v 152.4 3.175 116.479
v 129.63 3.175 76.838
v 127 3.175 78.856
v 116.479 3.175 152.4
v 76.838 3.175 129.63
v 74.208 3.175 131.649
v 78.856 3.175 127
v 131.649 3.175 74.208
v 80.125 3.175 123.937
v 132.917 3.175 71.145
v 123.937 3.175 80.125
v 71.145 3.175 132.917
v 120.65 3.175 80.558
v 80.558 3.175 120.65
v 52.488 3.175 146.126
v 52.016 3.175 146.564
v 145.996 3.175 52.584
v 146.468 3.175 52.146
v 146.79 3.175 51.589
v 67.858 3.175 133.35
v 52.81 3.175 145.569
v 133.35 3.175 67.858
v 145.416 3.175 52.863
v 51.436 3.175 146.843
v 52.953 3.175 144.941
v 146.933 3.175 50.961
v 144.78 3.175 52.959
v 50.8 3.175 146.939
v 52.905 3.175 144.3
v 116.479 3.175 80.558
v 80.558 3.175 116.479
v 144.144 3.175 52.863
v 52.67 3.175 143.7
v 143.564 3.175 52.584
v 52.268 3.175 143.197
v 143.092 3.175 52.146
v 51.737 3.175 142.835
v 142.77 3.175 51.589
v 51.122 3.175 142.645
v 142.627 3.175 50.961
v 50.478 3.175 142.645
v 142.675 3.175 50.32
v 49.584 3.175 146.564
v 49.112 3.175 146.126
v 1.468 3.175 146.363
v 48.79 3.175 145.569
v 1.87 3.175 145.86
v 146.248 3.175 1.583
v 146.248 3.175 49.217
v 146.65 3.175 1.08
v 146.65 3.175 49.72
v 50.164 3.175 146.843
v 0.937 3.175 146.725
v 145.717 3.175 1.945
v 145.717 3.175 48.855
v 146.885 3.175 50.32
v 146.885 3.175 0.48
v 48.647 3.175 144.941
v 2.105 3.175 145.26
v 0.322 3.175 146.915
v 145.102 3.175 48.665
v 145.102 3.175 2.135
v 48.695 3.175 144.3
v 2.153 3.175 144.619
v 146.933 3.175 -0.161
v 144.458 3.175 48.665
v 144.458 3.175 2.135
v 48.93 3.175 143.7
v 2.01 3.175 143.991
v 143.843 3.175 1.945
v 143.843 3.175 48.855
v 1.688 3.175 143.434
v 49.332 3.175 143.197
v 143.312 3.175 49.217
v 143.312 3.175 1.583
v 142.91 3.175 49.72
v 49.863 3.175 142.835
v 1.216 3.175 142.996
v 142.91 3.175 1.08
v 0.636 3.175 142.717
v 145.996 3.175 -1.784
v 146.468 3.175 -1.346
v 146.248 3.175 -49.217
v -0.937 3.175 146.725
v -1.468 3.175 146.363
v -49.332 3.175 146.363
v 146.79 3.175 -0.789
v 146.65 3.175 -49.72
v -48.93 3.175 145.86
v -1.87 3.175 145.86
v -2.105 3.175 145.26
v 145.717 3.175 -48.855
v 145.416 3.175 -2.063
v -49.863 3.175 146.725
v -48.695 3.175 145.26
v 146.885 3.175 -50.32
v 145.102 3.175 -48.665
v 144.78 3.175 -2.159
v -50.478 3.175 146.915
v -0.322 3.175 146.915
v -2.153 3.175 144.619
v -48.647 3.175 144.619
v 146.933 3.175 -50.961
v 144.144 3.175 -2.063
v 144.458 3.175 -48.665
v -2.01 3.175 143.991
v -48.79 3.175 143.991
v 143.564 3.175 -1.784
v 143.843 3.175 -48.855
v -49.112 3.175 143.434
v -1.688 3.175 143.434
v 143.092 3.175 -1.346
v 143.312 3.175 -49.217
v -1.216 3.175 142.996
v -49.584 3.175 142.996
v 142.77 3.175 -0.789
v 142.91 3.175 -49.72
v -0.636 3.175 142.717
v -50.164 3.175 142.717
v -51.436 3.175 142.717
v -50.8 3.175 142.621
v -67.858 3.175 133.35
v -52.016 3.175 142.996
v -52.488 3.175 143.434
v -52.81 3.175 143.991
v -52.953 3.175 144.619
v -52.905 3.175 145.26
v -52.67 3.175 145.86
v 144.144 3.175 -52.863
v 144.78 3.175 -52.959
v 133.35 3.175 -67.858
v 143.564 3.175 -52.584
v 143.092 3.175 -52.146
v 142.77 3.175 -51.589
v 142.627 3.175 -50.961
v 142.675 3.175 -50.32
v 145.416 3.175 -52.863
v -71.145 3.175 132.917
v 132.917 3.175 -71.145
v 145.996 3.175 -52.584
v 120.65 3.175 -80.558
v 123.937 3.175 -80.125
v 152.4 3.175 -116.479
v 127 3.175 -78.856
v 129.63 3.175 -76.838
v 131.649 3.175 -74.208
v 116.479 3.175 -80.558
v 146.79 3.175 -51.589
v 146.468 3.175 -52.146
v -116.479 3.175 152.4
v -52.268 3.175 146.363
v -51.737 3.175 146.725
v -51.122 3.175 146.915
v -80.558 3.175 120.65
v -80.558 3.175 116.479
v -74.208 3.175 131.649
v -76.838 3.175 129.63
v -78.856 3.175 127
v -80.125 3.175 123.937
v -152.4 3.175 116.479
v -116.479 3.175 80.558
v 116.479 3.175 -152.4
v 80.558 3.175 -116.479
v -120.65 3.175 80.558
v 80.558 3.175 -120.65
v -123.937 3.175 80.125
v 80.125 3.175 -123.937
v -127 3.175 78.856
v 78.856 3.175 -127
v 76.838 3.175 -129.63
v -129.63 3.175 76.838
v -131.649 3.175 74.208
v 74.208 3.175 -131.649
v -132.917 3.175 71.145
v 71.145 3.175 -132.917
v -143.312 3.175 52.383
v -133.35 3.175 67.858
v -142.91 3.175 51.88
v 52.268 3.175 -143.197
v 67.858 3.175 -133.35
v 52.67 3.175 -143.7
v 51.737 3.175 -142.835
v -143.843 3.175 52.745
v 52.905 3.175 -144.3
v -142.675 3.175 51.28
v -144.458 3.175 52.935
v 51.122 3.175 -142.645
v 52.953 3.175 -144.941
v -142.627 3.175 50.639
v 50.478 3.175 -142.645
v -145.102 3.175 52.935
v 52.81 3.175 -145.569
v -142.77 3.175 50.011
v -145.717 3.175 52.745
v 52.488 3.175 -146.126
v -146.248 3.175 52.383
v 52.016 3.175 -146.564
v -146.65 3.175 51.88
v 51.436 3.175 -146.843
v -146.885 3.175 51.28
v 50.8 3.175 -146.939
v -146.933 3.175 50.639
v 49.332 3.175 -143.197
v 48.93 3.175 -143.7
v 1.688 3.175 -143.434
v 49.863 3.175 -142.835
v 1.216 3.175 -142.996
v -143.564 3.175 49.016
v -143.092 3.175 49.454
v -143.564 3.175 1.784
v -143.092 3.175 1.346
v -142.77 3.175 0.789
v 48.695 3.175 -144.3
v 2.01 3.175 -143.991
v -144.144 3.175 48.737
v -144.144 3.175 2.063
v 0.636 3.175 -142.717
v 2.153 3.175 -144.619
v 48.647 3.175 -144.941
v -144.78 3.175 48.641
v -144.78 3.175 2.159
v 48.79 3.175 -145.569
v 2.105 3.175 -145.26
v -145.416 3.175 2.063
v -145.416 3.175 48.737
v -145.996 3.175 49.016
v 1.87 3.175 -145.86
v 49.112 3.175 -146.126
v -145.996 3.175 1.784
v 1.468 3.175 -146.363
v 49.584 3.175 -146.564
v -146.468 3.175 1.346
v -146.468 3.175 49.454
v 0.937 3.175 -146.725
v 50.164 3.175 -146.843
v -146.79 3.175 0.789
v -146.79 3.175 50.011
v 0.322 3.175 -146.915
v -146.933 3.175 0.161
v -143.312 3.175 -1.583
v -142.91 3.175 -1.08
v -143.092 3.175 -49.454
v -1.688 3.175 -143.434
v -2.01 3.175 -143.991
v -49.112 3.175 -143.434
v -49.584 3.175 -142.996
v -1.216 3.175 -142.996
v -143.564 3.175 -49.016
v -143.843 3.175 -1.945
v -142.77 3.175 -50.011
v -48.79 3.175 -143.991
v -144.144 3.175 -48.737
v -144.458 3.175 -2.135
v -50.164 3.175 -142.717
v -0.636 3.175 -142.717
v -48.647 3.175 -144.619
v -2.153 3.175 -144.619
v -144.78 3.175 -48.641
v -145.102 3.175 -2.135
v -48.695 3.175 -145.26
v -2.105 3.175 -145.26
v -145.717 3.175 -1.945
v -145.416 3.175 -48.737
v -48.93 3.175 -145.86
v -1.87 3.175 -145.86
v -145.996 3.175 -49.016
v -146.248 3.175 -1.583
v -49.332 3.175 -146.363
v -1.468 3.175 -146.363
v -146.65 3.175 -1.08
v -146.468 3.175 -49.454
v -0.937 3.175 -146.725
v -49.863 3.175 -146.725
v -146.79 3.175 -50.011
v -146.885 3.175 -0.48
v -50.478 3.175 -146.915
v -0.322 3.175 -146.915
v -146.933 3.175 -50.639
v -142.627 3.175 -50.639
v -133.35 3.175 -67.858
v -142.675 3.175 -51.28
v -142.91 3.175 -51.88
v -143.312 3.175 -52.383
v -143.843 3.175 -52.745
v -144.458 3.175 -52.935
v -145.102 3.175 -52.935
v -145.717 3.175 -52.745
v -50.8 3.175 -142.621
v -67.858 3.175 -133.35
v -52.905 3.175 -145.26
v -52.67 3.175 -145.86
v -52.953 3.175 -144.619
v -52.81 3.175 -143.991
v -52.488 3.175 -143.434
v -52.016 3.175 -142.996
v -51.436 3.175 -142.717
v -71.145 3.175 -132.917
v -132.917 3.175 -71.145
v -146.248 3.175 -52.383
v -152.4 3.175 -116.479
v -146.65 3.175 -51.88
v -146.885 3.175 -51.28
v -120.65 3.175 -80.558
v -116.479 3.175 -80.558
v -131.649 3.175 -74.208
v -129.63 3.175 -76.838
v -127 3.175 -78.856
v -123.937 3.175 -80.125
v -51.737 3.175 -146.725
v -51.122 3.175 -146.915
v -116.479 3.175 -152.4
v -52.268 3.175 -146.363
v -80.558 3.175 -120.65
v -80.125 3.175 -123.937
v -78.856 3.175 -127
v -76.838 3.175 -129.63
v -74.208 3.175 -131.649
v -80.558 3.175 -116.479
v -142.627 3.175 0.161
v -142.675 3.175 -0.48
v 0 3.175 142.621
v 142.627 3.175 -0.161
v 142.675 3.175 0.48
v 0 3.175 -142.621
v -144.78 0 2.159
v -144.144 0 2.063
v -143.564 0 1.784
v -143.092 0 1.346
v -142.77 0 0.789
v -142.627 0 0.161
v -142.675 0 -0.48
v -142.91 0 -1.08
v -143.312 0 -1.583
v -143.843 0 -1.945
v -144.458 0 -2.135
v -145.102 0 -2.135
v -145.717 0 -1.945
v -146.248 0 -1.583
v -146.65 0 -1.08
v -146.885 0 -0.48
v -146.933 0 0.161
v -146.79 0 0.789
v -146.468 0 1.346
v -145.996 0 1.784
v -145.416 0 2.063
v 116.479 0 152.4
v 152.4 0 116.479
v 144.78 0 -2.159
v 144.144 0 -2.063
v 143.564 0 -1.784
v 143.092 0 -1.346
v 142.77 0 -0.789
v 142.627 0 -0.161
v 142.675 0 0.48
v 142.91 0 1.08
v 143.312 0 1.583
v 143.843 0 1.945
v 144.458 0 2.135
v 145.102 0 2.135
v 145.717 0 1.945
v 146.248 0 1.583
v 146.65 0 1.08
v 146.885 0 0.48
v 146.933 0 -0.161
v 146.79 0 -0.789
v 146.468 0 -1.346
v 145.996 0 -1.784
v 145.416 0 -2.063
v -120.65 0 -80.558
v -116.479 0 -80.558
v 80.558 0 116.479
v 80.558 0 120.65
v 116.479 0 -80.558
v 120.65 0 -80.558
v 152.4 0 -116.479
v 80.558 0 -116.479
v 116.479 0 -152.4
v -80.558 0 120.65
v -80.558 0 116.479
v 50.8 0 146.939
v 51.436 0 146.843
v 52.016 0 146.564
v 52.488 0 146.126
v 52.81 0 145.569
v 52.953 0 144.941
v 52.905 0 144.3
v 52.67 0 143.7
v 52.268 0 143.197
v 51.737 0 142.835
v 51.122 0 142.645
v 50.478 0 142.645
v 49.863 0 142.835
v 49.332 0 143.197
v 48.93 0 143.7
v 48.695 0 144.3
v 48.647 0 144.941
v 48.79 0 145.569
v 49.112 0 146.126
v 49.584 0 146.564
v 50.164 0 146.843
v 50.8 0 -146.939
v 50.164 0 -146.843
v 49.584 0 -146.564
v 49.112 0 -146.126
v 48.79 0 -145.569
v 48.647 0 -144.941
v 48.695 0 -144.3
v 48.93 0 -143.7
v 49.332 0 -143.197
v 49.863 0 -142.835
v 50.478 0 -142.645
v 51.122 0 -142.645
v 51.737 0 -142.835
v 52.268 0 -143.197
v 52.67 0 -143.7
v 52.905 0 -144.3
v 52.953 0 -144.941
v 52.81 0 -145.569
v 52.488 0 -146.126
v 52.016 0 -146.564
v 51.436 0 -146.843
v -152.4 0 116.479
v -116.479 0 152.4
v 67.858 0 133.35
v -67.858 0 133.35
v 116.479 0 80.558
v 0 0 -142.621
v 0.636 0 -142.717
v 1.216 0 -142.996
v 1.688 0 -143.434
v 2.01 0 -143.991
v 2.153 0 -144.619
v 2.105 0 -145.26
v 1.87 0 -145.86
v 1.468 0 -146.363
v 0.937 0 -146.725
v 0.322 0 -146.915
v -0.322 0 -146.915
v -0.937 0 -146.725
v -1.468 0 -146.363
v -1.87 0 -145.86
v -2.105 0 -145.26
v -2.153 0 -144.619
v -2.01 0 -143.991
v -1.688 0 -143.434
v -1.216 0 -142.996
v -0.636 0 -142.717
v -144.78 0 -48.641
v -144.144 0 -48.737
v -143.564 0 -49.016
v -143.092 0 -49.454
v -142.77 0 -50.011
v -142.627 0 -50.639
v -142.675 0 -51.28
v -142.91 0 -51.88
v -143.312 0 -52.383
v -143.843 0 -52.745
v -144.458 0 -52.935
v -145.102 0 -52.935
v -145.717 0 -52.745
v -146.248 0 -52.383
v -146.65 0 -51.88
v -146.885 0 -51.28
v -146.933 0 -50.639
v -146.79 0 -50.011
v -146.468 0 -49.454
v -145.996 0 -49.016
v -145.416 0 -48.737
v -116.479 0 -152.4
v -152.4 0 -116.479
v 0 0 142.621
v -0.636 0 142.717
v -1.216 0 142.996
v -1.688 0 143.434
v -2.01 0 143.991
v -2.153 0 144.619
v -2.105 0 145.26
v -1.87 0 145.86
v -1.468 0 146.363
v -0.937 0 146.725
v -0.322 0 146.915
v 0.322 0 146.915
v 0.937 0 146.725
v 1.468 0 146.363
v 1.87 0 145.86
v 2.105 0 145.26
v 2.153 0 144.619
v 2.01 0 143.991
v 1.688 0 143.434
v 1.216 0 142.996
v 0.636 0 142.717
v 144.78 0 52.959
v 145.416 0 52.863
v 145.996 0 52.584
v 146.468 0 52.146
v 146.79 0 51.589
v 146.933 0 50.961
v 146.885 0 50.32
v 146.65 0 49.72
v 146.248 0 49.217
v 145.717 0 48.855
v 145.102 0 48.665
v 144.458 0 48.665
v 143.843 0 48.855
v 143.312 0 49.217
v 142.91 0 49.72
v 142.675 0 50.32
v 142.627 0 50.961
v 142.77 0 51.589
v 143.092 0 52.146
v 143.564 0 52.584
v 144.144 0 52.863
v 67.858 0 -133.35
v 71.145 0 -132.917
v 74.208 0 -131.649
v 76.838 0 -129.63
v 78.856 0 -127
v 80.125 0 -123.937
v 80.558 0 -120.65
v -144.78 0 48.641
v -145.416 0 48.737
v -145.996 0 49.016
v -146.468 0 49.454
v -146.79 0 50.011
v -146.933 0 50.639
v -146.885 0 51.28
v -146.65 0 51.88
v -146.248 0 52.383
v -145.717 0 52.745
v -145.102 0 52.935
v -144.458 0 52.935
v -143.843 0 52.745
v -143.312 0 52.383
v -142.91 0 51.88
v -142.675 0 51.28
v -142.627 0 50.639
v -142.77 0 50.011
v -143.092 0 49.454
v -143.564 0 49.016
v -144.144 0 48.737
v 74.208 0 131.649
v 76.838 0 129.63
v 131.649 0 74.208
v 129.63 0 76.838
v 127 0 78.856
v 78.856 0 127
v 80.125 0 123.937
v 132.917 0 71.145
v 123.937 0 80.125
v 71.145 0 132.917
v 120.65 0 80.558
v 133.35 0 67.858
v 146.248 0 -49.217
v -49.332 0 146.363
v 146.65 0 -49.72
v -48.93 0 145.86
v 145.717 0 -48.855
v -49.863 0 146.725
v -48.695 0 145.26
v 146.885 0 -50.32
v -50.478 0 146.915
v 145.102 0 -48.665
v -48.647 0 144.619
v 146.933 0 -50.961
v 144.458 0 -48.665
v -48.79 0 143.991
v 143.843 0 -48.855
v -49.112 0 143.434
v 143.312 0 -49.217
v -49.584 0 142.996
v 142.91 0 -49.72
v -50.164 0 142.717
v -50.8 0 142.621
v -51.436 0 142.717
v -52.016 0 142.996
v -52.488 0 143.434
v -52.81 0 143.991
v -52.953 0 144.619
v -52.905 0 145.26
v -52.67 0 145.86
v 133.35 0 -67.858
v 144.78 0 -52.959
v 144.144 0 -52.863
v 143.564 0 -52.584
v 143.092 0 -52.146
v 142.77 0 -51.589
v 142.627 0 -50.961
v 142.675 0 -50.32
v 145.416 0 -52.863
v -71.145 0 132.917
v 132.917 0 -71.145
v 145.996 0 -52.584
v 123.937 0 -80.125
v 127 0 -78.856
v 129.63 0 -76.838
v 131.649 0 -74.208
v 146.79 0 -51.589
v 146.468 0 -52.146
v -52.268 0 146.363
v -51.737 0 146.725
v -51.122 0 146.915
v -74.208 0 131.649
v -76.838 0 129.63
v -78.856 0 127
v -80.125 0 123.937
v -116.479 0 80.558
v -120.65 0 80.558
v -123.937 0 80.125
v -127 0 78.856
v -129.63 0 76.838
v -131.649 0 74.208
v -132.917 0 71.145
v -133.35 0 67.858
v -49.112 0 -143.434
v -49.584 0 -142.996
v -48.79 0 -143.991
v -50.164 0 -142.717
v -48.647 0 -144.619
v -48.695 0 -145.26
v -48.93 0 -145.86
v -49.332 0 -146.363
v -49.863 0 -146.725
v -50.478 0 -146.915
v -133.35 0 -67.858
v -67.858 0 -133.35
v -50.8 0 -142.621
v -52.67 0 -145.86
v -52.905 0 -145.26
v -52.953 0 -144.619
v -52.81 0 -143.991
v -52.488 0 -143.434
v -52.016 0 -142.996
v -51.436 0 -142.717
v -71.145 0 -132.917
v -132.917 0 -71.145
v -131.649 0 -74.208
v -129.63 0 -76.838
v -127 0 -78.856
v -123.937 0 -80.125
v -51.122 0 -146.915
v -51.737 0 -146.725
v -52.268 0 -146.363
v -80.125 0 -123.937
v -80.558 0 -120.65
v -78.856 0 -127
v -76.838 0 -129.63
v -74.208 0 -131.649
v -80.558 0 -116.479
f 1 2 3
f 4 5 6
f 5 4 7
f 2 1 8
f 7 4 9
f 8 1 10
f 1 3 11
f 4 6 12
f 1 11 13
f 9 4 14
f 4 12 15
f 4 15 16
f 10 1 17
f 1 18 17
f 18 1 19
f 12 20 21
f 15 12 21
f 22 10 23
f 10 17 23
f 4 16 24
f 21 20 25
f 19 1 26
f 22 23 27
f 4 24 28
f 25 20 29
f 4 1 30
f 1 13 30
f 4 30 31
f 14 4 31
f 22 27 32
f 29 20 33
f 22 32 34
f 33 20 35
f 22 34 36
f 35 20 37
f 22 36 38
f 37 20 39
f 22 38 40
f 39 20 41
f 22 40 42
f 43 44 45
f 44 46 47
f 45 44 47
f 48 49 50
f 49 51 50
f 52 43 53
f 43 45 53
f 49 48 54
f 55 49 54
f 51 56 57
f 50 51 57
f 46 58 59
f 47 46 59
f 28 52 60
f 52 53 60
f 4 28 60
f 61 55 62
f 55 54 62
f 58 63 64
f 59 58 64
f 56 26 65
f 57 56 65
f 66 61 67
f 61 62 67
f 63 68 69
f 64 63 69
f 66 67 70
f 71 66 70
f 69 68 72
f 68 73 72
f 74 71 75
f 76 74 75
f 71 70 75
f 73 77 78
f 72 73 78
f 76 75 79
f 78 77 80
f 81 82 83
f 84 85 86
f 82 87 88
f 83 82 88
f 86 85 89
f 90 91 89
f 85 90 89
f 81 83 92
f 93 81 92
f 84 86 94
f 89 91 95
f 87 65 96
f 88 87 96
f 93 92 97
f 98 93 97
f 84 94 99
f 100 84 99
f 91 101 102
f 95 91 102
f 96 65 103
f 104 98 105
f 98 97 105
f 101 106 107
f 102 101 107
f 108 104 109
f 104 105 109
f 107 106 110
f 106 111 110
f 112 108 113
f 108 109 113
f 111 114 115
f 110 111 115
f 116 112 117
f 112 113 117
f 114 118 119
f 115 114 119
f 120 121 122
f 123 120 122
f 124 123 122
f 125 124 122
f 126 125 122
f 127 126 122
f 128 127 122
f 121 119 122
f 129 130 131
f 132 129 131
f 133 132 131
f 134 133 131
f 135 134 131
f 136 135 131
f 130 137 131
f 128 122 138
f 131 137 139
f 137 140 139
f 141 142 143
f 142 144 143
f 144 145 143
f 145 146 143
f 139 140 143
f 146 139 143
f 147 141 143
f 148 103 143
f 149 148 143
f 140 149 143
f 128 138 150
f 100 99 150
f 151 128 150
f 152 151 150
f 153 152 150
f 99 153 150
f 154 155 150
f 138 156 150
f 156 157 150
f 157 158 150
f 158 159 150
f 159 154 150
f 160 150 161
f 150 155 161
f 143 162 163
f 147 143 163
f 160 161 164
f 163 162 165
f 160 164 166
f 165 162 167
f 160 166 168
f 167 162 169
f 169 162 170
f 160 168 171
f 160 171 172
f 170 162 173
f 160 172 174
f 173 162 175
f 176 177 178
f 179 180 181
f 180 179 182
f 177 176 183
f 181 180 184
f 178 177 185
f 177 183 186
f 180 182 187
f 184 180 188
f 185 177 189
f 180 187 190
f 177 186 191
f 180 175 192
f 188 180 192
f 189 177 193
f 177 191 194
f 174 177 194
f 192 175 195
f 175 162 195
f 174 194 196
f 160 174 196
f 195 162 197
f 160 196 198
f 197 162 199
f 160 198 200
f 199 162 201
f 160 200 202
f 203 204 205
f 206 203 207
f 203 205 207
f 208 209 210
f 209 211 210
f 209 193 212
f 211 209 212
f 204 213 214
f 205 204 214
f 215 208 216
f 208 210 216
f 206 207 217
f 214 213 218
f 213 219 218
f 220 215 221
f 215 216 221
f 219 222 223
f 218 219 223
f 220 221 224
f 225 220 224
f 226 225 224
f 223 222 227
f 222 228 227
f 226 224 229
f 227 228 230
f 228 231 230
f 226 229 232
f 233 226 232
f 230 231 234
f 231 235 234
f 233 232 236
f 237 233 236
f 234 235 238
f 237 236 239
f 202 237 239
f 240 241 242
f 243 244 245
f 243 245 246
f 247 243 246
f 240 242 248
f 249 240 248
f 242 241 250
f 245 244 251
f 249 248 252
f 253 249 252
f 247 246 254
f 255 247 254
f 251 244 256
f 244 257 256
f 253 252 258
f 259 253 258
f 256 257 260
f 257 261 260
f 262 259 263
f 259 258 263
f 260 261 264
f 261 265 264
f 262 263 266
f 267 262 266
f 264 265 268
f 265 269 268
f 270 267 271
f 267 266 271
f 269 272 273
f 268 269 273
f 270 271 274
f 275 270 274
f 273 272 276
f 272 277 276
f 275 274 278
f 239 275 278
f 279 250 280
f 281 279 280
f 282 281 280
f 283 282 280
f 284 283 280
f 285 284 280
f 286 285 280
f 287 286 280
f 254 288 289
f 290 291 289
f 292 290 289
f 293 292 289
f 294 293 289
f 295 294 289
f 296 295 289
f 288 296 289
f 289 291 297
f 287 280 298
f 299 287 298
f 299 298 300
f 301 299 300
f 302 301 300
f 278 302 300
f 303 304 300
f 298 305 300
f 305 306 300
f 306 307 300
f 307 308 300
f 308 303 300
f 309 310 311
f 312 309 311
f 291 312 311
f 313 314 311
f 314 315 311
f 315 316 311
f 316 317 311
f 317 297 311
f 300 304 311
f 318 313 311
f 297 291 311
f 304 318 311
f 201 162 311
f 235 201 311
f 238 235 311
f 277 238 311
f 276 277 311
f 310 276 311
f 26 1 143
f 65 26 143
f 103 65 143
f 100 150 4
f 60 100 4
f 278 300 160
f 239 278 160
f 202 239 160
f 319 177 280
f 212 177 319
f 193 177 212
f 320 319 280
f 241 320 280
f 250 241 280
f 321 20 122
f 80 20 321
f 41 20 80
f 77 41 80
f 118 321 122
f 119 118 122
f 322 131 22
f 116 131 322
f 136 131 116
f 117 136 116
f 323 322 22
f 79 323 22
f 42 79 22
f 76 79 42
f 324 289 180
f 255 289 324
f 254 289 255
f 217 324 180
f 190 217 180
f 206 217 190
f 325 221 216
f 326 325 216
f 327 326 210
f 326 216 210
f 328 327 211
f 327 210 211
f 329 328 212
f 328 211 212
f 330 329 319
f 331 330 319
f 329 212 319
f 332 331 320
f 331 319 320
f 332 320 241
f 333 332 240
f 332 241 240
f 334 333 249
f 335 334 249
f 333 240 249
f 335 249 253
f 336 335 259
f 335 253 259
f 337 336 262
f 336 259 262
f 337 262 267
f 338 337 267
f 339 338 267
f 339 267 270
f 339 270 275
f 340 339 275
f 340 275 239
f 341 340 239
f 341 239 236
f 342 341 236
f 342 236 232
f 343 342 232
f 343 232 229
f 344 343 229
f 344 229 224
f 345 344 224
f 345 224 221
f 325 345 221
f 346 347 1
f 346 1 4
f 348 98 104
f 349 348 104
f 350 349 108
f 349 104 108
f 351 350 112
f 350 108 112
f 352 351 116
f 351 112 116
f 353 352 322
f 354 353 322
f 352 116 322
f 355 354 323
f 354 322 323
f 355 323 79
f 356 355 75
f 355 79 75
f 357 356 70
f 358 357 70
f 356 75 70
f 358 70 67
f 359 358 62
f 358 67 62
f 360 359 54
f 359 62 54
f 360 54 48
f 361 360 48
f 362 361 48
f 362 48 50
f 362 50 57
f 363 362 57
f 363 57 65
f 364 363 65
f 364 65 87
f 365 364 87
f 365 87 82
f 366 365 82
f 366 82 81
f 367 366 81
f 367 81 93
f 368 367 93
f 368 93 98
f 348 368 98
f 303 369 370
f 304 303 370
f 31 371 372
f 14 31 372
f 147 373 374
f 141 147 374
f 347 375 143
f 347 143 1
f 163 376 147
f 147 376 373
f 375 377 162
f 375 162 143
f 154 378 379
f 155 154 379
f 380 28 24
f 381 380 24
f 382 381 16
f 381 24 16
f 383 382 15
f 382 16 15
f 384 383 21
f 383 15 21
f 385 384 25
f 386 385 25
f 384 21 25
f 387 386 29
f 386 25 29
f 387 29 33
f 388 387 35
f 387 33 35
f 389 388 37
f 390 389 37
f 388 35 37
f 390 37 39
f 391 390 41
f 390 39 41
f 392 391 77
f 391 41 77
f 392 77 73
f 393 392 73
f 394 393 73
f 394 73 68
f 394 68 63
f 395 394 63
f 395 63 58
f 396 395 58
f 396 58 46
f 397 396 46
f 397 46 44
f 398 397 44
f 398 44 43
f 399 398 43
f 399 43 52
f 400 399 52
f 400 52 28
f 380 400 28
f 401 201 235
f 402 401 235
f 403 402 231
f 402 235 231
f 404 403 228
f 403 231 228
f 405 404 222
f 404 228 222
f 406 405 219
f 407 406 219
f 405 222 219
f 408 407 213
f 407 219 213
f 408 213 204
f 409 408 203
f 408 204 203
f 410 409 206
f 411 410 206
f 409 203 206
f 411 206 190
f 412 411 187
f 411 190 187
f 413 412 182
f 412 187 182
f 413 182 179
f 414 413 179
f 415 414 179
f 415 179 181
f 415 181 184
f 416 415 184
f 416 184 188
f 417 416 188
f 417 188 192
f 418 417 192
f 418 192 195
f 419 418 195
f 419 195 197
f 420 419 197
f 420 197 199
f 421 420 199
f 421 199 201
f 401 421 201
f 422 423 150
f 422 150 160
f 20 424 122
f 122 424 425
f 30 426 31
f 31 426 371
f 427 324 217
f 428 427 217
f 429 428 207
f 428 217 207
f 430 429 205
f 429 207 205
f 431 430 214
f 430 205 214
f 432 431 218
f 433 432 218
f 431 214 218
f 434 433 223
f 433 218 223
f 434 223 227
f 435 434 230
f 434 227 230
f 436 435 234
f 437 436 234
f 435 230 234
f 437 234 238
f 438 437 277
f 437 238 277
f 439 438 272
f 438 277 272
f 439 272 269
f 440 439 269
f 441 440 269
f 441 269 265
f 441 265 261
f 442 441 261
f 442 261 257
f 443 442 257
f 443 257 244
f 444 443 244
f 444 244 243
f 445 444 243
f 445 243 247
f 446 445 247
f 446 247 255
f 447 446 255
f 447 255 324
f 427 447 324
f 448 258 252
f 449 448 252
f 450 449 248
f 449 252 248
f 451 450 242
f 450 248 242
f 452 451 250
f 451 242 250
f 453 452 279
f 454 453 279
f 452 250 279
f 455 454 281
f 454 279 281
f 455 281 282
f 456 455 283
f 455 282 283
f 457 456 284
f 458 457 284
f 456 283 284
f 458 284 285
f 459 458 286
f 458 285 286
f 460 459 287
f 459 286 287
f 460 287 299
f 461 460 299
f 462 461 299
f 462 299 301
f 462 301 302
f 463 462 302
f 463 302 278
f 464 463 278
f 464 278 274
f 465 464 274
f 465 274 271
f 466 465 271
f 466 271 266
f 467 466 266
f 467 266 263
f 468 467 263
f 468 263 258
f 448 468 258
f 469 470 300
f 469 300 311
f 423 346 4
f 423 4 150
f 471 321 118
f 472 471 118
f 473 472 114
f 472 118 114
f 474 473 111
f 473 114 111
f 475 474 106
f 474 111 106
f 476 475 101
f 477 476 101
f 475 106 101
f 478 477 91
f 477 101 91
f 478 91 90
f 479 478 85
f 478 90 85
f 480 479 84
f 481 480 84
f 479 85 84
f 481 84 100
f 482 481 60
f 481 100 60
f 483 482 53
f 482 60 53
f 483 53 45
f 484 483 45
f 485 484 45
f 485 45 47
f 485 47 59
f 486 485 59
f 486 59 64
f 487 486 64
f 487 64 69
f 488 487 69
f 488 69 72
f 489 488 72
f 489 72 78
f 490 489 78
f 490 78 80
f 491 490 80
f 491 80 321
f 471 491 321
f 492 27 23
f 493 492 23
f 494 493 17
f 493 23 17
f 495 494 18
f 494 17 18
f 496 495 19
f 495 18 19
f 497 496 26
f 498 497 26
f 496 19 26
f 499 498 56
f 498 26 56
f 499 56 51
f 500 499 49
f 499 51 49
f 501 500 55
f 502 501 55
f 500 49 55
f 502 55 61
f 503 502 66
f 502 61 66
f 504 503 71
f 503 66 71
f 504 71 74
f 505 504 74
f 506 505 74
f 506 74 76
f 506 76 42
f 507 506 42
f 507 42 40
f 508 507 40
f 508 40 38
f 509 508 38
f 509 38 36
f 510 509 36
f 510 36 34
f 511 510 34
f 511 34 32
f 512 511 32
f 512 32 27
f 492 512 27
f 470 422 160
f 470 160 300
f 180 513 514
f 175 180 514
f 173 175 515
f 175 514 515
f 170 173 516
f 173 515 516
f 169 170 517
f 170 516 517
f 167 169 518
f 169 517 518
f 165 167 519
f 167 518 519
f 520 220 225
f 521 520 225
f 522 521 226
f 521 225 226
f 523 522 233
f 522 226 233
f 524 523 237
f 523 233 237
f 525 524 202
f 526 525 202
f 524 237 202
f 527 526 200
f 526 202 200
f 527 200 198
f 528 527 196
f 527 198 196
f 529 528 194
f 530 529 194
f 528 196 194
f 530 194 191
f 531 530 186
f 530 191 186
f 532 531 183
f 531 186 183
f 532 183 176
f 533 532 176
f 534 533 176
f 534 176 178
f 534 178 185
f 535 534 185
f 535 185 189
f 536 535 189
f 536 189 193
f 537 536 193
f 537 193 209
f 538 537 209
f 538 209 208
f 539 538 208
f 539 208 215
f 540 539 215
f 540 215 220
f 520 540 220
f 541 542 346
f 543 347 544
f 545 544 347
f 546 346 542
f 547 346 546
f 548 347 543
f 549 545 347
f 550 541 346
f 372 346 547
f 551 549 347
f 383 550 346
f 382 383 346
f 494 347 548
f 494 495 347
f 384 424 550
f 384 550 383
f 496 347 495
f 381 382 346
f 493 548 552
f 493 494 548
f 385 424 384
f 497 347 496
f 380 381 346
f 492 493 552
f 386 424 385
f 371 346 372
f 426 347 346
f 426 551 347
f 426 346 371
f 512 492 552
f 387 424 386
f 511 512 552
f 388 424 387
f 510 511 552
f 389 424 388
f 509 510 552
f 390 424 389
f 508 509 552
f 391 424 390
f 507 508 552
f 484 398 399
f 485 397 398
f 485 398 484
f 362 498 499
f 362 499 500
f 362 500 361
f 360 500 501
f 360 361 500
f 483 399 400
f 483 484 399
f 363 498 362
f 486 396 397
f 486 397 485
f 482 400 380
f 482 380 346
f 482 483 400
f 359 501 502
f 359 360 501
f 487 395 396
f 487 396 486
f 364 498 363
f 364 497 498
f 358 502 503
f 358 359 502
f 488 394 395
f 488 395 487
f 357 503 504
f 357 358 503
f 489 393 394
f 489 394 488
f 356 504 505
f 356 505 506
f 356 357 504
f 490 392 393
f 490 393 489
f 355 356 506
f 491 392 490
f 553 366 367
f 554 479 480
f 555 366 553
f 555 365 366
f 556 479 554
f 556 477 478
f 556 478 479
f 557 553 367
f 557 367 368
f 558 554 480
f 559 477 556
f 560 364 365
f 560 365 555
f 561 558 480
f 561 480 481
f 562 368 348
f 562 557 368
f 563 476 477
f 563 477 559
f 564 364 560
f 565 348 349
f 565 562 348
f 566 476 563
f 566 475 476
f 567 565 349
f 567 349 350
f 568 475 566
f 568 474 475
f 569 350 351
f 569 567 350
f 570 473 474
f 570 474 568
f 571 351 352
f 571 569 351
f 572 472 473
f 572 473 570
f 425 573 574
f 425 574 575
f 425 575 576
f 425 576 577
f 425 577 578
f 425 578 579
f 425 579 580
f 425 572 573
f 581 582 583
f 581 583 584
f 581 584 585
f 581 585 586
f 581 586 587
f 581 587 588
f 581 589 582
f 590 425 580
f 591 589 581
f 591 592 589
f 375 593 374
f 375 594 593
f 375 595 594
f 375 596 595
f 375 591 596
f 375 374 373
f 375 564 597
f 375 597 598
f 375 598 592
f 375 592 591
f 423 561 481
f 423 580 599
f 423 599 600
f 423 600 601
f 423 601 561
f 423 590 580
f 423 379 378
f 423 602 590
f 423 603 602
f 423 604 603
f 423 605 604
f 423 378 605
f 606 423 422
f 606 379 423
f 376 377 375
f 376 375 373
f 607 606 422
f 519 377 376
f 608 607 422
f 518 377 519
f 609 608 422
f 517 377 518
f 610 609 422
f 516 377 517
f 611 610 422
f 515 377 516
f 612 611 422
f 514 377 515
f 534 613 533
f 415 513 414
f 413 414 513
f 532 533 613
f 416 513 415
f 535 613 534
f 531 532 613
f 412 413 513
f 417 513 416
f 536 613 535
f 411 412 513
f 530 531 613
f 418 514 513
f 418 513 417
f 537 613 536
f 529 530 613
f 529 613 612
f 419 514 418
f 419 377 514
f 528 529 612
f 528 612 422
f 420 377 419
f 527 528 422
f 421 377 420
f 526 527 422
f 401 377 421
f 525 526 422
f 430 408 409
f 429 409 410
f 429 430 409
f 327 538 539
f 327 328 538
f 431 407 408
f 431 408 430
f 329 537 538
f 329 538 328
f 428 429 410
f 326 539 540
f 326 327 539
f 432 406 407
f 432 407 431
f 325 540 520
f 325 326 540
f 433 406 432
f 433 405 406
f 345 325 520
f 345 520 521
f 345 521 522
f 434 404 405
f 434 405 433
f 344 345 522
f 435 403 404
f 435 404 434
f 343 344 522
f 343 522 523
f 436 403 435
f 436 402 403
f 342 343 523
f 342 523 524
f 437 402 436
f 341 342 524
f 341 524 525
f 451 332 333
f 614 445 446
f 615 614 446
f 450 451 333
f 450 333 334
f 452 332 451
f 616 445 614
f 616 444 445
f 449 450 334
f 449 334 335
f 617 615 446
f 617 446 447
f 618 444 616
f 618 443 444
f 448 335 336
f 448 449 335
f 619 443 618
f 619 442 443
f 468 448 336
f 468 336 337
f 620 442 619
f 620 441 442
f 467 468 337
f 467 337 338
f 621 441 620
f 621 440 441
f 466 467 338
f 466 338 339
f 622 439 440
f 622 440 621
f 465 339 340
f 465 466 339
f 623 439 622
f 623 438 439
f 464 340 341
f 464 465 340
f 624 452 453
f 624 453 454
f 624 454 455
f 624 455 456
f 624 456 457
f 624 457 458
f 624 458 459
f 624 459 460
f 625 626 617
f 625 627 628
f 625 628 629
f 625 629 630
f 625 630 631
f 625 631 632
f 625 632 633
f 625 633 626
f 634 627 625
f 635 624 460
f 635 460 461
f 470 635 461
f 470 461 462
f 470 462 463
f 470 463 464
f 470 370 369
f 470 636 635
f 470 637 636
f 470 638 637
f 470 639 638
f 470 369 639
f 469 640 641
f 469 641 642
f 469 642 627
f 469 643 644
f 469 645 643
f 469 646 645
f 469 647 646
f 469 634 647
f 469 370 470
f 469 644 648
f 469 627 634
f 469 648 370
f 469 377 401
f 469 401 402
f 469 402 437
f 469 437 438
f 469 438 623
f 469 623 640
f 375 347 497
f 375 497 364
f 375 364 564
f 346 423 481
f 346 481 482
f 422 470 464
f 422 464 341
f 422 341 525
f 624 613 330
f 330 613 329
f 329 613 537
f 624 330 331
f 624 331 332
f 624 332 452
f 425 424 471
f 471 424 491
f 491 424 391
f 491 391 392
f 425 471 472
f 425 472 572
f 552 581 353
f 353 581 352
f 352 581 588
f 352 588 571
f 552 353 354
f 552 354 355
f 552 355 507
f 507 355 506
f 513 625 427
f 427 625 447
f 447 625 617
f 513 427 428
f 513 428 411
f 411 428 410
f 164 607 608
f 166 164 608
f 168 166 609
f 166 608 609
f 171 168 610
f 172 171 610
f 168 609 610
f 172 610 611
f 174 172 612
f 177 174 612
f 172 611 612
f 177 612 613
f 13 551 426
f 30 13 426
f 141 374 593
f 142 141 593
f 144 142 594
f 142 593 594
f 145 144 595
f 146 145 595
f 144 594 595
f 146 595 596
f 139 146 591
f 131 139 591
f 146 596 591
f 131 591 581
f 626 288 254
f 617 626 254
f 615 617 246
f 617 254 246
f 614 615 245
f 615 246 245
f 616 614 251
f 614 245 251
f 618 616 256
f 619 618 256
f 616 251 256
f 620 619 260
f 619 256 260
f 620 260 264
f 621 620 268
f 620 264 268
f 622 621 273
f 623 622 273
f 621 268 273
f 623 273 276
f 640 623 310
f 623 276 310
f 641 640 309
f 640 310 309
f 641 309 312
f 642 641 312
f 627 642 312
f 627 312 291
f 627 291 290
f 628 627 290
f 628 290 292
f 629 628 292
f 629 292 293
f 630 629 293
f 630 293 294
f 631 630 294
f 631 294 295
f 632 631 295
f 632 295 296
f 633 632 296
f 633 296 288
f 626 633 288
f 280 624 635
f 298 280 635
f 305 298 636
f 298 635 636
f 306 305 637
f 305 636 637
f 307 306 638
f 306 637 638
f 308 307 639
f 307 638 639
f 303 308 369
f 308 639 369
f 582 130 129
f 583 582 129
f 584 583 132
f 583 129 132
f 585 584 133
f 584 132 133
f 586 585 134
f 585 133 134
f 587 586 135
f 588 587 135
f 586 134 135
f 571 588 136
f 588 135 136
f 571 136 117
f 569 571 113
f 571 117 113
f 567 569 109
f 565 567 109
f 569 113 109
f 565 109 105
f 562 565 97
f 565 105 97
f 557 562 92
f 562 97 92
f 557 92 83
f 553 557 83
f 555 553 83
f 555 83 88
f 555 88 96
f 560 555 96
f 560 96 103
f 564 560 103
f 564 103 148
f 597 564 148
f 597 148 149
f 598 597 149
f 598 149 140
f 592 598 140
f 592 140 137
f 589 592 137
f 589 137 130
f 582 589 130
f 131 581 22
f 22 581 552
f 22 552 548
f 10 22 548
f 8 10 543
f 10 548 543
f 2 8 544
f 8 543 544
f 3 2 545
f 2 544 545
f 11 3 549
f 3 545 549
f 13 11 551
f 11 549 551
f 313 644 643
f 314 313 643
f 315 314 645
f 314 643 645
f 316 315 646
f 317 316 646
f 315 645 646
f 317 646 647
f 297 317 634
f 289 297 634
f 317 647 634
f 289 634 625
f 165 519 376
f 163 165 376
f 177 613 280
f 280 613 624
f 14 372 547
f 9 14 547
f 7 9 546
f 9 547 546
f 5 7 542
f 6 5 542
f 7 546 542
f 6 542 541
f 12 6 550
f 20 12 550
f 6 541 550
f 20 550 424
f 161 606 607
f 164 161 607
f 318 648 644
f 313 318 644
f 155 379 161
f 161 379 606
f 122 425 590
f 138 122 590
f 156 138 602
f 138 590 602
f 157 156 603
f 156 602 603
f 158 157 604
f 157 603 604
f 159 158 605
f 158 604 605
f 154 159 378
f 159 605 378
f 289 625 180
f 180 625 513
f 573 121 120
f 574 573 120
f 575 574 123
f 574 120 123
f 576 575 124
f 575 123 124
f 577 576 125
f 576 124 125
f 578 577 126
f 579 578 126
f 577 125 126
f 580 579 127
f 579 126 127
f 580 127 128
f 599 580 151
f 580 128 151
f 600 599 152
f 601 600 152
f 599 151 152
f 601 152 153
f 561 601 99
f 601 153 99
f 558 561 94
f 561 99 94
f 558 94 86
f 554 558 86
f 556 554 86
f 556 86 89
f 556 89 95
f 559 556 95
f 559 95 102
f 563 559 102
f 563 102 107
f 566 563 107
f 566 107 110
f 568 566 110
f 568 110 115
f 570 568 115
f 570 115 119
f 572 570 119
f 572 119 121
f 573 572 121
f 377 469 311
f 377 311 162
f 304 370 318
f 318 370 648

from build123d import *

# Parameters (mm, degrees)
BOSS_EXTRUDE1_DEPTH = 3.175
SKETCH4_R           = 2.159
CUT_EXTRUDE2_DEPTH  = 216.549531721


with BuildPart() as part:
    # Sketch2 → Boss-Extrude1 (new body)
    with BuildSketch(Plane(origin=(0, 0, 0), x_dir=(1, 0, 0), z_dir=(0, 1, 0))):
        Polygon((-152.4, 116.478975516), (-116.478975516, 152.4), (116.478975516, 152.4), (152.4, 116.478975516), (152.4, -116.478975516), (116.478975516, -152.4), (-116.478975516, -152.4), (-152.4, -116.478975516), align=None)
        with BuildLine():
            Line((-116.478975516, 80.557951031), (-80.557951031, 116.478975516))
            Line((-80.557951031, 116.478975516), (-80.557951031, 120.65))
            ThreePointArc((-80.557951031, 120.65), (-76.838207153, 129.630256121), (-67.857951031, 133.35))
            Line((-67.857951031, 133.35), (67.857951031, 133.35))
            ThreePointArc((67.857951031, 133.35), (76.838207153, 129.630256121), (80.557951031, 120.65))
            Line((80.557951031, 120.65), (80.557951031, 116.478975516))
            Line((80.557951031, 116.478975516), (116.478975516, 80.557951031))
            Line((116.478975516, 80.557951031), (120.65, 80.557951031))
            ThreePointArc((120.65, 80.557951031), (129.630256121, 76.838207153), (133.35, 67.857951031))
            Line((133.35, 67.857951031), (133.35, -67.857951031))
            ThreePointArc((133.35, -67.857951031), (129.630256121, -76.838207153), (120.65, -80.557951031))
            Line((120.65, -80.557951031), (116.478975516, -80.557951031))
            Line((116.478975516, -80.557951031), (80.557951031, -116.478975516))
            Line((80.557951031, -116.478975516), (80.557951031, -120.65))
            ThreePointArc((80.557951031, -120.65), (76.838207153, -129.630256121), (67.857951031, -133.35))
            Line((67.857951031, -133.35), (-67.857951031, -133.35))
            ThreePointArc((-67.857951031, -133.35), (-76.838207153, -129.630256121), (-80.557951031, -120.65))
            Line((-80.557951031, -120.65), (-80.557951031, -116.478975516))
            Line((-80.557951031, -116.478975516), (-116.478975516, -80.557951031))
            Line((-116.478975516, -80.557951031), (-120.65, -80.557951031))
            ThreePointArc((-120.65, -80.557951031), (-129.630256121, -76.838207153), (-133.35, -67.857951031))
            Line((-133.35, -67.857951031), (-133.35, 67.857951031))
            ThreePointArc((-133.35, 67.857951031), (-129.630256121, 76.838207153), (-120.65, 80.557951031))
            Line((-120.65, 80.557951031), (-116.478975516, 80.557951031))
        make_face(mode=Mode.SUBTRACT)
    extrude(amount=BOSS_EXTRUDE1_DEPTH)

    # Sketch4 → Cut-Extrude2 (cut, through all)
    with BuildSketch(Plane(origin=(0, 3.175, 0), x_dir=(1, 0, 0), z_dir=(0, 1, 0))):
        with Locations(Location((0, 144.78, 0), (0, 0, 270))):
            Circle(SKETCH4_R)
        with Locations(Location((-50.8, 144.78, 0), (0, 0, 270))):
            Circle(SKETCH4_R)
        with Locations(Location((-144.78, 50.8, 0), (0, 0, 270))):
            Circle(SKETCH4_R)
        with Locations(Location((-144.78, 0, 0), (0, 0, 270))):
            Circle(SKETCH4_R)
        with Locations(Location((144.78, 0, 0), (0, 0, 90))):
            Circle(SKETCH4_R)
        with Locations(Location((144.78, 50.8, 0), (0, 0, 90))):
            Circle(SKETCH4_R)
        with Locations(Location((50.8, 144.78, 0), (0, 0, 90))):
            Circle(SKETCH4_R)
        with Locations(Location((50.8, -144.78, 0), (0, 0, 270))):
            Circle(SKETCH4_R)
        with Locations(Location((144.78, -50.8, 0), (0, 0, 270))):
            Circle(SKETCH4_R)
        with Locations(Location((-50.8, -144.78, 0), (0, 0, 90))):
            Circle(SKETCH4_R)
        with Locations(Location((0, -144.78, 0), (0, 0, 90))):
            Circle(SKETCH4_R)
        with Locations(Location((-144.78, -50.8, 0), (0, 0, 90))):
            Circle(SKETCH4_R)
    extrude(amount=-CUT_EXTRUDE2_DEPTH, mode=Mode.SUBTRACT)


solid = part.part
